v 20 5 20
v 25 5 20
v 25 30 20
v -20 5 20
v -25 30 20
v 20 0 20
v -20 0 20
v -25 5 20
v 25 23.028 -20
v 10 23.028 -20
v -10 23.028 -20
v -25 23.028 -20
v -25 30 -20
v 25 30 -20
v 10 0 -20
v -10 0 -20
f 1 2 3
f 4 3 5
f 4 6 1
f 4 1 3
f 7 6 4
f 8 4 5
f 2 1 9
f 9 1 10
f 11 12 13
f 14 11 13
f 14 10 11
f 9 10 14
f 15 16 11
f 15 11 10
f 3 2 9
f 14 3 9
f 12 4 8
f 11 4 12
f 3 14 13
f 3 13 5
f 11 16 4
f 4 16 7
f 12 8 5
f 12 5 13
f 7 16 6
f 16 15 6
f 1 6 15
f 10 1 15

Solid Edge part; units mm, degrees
sketch "Sketch1" plane through (0, 0, 0) normal (0, -1, 0) x (1, 0, 0)
  line L0 (20, 20) -> (10, -20)
  line L1 (-10, -20) -> (10, -20)
  line L2 (-10, -20) -> (-20, 20)
  line L3 (20, 20) -> (-20, 20)
extrude "Protrusion1" add sketch "Sketch1" against normal blind 30
sketch "Sketch2" plane through (0, 0, 0) normal (1, 0, 0) x (0, 1, 0)
  line L0 (30, -20) -> (23.0281, -20)
  line L1 (5, 20) -> (23.0281, -20)
  line L2 (30, 20) -> (5, 20)
  line L3 (30, -13.924) -> (30, 20)
extrude "ExtrudedProtrusion_3" add sketch "Sketch2" along normal blind 25 material side at (0, 26.514, -19.95)
sketch "Sketch3" plane through (0, 0, 0) normal (1, 0, 0) x (0, 1, 0)
  line L0 (30, -20) -> (23.0281, -20)
  line L1 (5, 20) -> (23.0281, -20)
  line L2 (30, 20) -> (5, 20)
  line L3 (30, -13.924) -> (30, 20)
extrude "ExtrudedProtrusion_4" add sketch "Sketch3" against normal blind 25 material side at (0, 26.514, -19.95)
